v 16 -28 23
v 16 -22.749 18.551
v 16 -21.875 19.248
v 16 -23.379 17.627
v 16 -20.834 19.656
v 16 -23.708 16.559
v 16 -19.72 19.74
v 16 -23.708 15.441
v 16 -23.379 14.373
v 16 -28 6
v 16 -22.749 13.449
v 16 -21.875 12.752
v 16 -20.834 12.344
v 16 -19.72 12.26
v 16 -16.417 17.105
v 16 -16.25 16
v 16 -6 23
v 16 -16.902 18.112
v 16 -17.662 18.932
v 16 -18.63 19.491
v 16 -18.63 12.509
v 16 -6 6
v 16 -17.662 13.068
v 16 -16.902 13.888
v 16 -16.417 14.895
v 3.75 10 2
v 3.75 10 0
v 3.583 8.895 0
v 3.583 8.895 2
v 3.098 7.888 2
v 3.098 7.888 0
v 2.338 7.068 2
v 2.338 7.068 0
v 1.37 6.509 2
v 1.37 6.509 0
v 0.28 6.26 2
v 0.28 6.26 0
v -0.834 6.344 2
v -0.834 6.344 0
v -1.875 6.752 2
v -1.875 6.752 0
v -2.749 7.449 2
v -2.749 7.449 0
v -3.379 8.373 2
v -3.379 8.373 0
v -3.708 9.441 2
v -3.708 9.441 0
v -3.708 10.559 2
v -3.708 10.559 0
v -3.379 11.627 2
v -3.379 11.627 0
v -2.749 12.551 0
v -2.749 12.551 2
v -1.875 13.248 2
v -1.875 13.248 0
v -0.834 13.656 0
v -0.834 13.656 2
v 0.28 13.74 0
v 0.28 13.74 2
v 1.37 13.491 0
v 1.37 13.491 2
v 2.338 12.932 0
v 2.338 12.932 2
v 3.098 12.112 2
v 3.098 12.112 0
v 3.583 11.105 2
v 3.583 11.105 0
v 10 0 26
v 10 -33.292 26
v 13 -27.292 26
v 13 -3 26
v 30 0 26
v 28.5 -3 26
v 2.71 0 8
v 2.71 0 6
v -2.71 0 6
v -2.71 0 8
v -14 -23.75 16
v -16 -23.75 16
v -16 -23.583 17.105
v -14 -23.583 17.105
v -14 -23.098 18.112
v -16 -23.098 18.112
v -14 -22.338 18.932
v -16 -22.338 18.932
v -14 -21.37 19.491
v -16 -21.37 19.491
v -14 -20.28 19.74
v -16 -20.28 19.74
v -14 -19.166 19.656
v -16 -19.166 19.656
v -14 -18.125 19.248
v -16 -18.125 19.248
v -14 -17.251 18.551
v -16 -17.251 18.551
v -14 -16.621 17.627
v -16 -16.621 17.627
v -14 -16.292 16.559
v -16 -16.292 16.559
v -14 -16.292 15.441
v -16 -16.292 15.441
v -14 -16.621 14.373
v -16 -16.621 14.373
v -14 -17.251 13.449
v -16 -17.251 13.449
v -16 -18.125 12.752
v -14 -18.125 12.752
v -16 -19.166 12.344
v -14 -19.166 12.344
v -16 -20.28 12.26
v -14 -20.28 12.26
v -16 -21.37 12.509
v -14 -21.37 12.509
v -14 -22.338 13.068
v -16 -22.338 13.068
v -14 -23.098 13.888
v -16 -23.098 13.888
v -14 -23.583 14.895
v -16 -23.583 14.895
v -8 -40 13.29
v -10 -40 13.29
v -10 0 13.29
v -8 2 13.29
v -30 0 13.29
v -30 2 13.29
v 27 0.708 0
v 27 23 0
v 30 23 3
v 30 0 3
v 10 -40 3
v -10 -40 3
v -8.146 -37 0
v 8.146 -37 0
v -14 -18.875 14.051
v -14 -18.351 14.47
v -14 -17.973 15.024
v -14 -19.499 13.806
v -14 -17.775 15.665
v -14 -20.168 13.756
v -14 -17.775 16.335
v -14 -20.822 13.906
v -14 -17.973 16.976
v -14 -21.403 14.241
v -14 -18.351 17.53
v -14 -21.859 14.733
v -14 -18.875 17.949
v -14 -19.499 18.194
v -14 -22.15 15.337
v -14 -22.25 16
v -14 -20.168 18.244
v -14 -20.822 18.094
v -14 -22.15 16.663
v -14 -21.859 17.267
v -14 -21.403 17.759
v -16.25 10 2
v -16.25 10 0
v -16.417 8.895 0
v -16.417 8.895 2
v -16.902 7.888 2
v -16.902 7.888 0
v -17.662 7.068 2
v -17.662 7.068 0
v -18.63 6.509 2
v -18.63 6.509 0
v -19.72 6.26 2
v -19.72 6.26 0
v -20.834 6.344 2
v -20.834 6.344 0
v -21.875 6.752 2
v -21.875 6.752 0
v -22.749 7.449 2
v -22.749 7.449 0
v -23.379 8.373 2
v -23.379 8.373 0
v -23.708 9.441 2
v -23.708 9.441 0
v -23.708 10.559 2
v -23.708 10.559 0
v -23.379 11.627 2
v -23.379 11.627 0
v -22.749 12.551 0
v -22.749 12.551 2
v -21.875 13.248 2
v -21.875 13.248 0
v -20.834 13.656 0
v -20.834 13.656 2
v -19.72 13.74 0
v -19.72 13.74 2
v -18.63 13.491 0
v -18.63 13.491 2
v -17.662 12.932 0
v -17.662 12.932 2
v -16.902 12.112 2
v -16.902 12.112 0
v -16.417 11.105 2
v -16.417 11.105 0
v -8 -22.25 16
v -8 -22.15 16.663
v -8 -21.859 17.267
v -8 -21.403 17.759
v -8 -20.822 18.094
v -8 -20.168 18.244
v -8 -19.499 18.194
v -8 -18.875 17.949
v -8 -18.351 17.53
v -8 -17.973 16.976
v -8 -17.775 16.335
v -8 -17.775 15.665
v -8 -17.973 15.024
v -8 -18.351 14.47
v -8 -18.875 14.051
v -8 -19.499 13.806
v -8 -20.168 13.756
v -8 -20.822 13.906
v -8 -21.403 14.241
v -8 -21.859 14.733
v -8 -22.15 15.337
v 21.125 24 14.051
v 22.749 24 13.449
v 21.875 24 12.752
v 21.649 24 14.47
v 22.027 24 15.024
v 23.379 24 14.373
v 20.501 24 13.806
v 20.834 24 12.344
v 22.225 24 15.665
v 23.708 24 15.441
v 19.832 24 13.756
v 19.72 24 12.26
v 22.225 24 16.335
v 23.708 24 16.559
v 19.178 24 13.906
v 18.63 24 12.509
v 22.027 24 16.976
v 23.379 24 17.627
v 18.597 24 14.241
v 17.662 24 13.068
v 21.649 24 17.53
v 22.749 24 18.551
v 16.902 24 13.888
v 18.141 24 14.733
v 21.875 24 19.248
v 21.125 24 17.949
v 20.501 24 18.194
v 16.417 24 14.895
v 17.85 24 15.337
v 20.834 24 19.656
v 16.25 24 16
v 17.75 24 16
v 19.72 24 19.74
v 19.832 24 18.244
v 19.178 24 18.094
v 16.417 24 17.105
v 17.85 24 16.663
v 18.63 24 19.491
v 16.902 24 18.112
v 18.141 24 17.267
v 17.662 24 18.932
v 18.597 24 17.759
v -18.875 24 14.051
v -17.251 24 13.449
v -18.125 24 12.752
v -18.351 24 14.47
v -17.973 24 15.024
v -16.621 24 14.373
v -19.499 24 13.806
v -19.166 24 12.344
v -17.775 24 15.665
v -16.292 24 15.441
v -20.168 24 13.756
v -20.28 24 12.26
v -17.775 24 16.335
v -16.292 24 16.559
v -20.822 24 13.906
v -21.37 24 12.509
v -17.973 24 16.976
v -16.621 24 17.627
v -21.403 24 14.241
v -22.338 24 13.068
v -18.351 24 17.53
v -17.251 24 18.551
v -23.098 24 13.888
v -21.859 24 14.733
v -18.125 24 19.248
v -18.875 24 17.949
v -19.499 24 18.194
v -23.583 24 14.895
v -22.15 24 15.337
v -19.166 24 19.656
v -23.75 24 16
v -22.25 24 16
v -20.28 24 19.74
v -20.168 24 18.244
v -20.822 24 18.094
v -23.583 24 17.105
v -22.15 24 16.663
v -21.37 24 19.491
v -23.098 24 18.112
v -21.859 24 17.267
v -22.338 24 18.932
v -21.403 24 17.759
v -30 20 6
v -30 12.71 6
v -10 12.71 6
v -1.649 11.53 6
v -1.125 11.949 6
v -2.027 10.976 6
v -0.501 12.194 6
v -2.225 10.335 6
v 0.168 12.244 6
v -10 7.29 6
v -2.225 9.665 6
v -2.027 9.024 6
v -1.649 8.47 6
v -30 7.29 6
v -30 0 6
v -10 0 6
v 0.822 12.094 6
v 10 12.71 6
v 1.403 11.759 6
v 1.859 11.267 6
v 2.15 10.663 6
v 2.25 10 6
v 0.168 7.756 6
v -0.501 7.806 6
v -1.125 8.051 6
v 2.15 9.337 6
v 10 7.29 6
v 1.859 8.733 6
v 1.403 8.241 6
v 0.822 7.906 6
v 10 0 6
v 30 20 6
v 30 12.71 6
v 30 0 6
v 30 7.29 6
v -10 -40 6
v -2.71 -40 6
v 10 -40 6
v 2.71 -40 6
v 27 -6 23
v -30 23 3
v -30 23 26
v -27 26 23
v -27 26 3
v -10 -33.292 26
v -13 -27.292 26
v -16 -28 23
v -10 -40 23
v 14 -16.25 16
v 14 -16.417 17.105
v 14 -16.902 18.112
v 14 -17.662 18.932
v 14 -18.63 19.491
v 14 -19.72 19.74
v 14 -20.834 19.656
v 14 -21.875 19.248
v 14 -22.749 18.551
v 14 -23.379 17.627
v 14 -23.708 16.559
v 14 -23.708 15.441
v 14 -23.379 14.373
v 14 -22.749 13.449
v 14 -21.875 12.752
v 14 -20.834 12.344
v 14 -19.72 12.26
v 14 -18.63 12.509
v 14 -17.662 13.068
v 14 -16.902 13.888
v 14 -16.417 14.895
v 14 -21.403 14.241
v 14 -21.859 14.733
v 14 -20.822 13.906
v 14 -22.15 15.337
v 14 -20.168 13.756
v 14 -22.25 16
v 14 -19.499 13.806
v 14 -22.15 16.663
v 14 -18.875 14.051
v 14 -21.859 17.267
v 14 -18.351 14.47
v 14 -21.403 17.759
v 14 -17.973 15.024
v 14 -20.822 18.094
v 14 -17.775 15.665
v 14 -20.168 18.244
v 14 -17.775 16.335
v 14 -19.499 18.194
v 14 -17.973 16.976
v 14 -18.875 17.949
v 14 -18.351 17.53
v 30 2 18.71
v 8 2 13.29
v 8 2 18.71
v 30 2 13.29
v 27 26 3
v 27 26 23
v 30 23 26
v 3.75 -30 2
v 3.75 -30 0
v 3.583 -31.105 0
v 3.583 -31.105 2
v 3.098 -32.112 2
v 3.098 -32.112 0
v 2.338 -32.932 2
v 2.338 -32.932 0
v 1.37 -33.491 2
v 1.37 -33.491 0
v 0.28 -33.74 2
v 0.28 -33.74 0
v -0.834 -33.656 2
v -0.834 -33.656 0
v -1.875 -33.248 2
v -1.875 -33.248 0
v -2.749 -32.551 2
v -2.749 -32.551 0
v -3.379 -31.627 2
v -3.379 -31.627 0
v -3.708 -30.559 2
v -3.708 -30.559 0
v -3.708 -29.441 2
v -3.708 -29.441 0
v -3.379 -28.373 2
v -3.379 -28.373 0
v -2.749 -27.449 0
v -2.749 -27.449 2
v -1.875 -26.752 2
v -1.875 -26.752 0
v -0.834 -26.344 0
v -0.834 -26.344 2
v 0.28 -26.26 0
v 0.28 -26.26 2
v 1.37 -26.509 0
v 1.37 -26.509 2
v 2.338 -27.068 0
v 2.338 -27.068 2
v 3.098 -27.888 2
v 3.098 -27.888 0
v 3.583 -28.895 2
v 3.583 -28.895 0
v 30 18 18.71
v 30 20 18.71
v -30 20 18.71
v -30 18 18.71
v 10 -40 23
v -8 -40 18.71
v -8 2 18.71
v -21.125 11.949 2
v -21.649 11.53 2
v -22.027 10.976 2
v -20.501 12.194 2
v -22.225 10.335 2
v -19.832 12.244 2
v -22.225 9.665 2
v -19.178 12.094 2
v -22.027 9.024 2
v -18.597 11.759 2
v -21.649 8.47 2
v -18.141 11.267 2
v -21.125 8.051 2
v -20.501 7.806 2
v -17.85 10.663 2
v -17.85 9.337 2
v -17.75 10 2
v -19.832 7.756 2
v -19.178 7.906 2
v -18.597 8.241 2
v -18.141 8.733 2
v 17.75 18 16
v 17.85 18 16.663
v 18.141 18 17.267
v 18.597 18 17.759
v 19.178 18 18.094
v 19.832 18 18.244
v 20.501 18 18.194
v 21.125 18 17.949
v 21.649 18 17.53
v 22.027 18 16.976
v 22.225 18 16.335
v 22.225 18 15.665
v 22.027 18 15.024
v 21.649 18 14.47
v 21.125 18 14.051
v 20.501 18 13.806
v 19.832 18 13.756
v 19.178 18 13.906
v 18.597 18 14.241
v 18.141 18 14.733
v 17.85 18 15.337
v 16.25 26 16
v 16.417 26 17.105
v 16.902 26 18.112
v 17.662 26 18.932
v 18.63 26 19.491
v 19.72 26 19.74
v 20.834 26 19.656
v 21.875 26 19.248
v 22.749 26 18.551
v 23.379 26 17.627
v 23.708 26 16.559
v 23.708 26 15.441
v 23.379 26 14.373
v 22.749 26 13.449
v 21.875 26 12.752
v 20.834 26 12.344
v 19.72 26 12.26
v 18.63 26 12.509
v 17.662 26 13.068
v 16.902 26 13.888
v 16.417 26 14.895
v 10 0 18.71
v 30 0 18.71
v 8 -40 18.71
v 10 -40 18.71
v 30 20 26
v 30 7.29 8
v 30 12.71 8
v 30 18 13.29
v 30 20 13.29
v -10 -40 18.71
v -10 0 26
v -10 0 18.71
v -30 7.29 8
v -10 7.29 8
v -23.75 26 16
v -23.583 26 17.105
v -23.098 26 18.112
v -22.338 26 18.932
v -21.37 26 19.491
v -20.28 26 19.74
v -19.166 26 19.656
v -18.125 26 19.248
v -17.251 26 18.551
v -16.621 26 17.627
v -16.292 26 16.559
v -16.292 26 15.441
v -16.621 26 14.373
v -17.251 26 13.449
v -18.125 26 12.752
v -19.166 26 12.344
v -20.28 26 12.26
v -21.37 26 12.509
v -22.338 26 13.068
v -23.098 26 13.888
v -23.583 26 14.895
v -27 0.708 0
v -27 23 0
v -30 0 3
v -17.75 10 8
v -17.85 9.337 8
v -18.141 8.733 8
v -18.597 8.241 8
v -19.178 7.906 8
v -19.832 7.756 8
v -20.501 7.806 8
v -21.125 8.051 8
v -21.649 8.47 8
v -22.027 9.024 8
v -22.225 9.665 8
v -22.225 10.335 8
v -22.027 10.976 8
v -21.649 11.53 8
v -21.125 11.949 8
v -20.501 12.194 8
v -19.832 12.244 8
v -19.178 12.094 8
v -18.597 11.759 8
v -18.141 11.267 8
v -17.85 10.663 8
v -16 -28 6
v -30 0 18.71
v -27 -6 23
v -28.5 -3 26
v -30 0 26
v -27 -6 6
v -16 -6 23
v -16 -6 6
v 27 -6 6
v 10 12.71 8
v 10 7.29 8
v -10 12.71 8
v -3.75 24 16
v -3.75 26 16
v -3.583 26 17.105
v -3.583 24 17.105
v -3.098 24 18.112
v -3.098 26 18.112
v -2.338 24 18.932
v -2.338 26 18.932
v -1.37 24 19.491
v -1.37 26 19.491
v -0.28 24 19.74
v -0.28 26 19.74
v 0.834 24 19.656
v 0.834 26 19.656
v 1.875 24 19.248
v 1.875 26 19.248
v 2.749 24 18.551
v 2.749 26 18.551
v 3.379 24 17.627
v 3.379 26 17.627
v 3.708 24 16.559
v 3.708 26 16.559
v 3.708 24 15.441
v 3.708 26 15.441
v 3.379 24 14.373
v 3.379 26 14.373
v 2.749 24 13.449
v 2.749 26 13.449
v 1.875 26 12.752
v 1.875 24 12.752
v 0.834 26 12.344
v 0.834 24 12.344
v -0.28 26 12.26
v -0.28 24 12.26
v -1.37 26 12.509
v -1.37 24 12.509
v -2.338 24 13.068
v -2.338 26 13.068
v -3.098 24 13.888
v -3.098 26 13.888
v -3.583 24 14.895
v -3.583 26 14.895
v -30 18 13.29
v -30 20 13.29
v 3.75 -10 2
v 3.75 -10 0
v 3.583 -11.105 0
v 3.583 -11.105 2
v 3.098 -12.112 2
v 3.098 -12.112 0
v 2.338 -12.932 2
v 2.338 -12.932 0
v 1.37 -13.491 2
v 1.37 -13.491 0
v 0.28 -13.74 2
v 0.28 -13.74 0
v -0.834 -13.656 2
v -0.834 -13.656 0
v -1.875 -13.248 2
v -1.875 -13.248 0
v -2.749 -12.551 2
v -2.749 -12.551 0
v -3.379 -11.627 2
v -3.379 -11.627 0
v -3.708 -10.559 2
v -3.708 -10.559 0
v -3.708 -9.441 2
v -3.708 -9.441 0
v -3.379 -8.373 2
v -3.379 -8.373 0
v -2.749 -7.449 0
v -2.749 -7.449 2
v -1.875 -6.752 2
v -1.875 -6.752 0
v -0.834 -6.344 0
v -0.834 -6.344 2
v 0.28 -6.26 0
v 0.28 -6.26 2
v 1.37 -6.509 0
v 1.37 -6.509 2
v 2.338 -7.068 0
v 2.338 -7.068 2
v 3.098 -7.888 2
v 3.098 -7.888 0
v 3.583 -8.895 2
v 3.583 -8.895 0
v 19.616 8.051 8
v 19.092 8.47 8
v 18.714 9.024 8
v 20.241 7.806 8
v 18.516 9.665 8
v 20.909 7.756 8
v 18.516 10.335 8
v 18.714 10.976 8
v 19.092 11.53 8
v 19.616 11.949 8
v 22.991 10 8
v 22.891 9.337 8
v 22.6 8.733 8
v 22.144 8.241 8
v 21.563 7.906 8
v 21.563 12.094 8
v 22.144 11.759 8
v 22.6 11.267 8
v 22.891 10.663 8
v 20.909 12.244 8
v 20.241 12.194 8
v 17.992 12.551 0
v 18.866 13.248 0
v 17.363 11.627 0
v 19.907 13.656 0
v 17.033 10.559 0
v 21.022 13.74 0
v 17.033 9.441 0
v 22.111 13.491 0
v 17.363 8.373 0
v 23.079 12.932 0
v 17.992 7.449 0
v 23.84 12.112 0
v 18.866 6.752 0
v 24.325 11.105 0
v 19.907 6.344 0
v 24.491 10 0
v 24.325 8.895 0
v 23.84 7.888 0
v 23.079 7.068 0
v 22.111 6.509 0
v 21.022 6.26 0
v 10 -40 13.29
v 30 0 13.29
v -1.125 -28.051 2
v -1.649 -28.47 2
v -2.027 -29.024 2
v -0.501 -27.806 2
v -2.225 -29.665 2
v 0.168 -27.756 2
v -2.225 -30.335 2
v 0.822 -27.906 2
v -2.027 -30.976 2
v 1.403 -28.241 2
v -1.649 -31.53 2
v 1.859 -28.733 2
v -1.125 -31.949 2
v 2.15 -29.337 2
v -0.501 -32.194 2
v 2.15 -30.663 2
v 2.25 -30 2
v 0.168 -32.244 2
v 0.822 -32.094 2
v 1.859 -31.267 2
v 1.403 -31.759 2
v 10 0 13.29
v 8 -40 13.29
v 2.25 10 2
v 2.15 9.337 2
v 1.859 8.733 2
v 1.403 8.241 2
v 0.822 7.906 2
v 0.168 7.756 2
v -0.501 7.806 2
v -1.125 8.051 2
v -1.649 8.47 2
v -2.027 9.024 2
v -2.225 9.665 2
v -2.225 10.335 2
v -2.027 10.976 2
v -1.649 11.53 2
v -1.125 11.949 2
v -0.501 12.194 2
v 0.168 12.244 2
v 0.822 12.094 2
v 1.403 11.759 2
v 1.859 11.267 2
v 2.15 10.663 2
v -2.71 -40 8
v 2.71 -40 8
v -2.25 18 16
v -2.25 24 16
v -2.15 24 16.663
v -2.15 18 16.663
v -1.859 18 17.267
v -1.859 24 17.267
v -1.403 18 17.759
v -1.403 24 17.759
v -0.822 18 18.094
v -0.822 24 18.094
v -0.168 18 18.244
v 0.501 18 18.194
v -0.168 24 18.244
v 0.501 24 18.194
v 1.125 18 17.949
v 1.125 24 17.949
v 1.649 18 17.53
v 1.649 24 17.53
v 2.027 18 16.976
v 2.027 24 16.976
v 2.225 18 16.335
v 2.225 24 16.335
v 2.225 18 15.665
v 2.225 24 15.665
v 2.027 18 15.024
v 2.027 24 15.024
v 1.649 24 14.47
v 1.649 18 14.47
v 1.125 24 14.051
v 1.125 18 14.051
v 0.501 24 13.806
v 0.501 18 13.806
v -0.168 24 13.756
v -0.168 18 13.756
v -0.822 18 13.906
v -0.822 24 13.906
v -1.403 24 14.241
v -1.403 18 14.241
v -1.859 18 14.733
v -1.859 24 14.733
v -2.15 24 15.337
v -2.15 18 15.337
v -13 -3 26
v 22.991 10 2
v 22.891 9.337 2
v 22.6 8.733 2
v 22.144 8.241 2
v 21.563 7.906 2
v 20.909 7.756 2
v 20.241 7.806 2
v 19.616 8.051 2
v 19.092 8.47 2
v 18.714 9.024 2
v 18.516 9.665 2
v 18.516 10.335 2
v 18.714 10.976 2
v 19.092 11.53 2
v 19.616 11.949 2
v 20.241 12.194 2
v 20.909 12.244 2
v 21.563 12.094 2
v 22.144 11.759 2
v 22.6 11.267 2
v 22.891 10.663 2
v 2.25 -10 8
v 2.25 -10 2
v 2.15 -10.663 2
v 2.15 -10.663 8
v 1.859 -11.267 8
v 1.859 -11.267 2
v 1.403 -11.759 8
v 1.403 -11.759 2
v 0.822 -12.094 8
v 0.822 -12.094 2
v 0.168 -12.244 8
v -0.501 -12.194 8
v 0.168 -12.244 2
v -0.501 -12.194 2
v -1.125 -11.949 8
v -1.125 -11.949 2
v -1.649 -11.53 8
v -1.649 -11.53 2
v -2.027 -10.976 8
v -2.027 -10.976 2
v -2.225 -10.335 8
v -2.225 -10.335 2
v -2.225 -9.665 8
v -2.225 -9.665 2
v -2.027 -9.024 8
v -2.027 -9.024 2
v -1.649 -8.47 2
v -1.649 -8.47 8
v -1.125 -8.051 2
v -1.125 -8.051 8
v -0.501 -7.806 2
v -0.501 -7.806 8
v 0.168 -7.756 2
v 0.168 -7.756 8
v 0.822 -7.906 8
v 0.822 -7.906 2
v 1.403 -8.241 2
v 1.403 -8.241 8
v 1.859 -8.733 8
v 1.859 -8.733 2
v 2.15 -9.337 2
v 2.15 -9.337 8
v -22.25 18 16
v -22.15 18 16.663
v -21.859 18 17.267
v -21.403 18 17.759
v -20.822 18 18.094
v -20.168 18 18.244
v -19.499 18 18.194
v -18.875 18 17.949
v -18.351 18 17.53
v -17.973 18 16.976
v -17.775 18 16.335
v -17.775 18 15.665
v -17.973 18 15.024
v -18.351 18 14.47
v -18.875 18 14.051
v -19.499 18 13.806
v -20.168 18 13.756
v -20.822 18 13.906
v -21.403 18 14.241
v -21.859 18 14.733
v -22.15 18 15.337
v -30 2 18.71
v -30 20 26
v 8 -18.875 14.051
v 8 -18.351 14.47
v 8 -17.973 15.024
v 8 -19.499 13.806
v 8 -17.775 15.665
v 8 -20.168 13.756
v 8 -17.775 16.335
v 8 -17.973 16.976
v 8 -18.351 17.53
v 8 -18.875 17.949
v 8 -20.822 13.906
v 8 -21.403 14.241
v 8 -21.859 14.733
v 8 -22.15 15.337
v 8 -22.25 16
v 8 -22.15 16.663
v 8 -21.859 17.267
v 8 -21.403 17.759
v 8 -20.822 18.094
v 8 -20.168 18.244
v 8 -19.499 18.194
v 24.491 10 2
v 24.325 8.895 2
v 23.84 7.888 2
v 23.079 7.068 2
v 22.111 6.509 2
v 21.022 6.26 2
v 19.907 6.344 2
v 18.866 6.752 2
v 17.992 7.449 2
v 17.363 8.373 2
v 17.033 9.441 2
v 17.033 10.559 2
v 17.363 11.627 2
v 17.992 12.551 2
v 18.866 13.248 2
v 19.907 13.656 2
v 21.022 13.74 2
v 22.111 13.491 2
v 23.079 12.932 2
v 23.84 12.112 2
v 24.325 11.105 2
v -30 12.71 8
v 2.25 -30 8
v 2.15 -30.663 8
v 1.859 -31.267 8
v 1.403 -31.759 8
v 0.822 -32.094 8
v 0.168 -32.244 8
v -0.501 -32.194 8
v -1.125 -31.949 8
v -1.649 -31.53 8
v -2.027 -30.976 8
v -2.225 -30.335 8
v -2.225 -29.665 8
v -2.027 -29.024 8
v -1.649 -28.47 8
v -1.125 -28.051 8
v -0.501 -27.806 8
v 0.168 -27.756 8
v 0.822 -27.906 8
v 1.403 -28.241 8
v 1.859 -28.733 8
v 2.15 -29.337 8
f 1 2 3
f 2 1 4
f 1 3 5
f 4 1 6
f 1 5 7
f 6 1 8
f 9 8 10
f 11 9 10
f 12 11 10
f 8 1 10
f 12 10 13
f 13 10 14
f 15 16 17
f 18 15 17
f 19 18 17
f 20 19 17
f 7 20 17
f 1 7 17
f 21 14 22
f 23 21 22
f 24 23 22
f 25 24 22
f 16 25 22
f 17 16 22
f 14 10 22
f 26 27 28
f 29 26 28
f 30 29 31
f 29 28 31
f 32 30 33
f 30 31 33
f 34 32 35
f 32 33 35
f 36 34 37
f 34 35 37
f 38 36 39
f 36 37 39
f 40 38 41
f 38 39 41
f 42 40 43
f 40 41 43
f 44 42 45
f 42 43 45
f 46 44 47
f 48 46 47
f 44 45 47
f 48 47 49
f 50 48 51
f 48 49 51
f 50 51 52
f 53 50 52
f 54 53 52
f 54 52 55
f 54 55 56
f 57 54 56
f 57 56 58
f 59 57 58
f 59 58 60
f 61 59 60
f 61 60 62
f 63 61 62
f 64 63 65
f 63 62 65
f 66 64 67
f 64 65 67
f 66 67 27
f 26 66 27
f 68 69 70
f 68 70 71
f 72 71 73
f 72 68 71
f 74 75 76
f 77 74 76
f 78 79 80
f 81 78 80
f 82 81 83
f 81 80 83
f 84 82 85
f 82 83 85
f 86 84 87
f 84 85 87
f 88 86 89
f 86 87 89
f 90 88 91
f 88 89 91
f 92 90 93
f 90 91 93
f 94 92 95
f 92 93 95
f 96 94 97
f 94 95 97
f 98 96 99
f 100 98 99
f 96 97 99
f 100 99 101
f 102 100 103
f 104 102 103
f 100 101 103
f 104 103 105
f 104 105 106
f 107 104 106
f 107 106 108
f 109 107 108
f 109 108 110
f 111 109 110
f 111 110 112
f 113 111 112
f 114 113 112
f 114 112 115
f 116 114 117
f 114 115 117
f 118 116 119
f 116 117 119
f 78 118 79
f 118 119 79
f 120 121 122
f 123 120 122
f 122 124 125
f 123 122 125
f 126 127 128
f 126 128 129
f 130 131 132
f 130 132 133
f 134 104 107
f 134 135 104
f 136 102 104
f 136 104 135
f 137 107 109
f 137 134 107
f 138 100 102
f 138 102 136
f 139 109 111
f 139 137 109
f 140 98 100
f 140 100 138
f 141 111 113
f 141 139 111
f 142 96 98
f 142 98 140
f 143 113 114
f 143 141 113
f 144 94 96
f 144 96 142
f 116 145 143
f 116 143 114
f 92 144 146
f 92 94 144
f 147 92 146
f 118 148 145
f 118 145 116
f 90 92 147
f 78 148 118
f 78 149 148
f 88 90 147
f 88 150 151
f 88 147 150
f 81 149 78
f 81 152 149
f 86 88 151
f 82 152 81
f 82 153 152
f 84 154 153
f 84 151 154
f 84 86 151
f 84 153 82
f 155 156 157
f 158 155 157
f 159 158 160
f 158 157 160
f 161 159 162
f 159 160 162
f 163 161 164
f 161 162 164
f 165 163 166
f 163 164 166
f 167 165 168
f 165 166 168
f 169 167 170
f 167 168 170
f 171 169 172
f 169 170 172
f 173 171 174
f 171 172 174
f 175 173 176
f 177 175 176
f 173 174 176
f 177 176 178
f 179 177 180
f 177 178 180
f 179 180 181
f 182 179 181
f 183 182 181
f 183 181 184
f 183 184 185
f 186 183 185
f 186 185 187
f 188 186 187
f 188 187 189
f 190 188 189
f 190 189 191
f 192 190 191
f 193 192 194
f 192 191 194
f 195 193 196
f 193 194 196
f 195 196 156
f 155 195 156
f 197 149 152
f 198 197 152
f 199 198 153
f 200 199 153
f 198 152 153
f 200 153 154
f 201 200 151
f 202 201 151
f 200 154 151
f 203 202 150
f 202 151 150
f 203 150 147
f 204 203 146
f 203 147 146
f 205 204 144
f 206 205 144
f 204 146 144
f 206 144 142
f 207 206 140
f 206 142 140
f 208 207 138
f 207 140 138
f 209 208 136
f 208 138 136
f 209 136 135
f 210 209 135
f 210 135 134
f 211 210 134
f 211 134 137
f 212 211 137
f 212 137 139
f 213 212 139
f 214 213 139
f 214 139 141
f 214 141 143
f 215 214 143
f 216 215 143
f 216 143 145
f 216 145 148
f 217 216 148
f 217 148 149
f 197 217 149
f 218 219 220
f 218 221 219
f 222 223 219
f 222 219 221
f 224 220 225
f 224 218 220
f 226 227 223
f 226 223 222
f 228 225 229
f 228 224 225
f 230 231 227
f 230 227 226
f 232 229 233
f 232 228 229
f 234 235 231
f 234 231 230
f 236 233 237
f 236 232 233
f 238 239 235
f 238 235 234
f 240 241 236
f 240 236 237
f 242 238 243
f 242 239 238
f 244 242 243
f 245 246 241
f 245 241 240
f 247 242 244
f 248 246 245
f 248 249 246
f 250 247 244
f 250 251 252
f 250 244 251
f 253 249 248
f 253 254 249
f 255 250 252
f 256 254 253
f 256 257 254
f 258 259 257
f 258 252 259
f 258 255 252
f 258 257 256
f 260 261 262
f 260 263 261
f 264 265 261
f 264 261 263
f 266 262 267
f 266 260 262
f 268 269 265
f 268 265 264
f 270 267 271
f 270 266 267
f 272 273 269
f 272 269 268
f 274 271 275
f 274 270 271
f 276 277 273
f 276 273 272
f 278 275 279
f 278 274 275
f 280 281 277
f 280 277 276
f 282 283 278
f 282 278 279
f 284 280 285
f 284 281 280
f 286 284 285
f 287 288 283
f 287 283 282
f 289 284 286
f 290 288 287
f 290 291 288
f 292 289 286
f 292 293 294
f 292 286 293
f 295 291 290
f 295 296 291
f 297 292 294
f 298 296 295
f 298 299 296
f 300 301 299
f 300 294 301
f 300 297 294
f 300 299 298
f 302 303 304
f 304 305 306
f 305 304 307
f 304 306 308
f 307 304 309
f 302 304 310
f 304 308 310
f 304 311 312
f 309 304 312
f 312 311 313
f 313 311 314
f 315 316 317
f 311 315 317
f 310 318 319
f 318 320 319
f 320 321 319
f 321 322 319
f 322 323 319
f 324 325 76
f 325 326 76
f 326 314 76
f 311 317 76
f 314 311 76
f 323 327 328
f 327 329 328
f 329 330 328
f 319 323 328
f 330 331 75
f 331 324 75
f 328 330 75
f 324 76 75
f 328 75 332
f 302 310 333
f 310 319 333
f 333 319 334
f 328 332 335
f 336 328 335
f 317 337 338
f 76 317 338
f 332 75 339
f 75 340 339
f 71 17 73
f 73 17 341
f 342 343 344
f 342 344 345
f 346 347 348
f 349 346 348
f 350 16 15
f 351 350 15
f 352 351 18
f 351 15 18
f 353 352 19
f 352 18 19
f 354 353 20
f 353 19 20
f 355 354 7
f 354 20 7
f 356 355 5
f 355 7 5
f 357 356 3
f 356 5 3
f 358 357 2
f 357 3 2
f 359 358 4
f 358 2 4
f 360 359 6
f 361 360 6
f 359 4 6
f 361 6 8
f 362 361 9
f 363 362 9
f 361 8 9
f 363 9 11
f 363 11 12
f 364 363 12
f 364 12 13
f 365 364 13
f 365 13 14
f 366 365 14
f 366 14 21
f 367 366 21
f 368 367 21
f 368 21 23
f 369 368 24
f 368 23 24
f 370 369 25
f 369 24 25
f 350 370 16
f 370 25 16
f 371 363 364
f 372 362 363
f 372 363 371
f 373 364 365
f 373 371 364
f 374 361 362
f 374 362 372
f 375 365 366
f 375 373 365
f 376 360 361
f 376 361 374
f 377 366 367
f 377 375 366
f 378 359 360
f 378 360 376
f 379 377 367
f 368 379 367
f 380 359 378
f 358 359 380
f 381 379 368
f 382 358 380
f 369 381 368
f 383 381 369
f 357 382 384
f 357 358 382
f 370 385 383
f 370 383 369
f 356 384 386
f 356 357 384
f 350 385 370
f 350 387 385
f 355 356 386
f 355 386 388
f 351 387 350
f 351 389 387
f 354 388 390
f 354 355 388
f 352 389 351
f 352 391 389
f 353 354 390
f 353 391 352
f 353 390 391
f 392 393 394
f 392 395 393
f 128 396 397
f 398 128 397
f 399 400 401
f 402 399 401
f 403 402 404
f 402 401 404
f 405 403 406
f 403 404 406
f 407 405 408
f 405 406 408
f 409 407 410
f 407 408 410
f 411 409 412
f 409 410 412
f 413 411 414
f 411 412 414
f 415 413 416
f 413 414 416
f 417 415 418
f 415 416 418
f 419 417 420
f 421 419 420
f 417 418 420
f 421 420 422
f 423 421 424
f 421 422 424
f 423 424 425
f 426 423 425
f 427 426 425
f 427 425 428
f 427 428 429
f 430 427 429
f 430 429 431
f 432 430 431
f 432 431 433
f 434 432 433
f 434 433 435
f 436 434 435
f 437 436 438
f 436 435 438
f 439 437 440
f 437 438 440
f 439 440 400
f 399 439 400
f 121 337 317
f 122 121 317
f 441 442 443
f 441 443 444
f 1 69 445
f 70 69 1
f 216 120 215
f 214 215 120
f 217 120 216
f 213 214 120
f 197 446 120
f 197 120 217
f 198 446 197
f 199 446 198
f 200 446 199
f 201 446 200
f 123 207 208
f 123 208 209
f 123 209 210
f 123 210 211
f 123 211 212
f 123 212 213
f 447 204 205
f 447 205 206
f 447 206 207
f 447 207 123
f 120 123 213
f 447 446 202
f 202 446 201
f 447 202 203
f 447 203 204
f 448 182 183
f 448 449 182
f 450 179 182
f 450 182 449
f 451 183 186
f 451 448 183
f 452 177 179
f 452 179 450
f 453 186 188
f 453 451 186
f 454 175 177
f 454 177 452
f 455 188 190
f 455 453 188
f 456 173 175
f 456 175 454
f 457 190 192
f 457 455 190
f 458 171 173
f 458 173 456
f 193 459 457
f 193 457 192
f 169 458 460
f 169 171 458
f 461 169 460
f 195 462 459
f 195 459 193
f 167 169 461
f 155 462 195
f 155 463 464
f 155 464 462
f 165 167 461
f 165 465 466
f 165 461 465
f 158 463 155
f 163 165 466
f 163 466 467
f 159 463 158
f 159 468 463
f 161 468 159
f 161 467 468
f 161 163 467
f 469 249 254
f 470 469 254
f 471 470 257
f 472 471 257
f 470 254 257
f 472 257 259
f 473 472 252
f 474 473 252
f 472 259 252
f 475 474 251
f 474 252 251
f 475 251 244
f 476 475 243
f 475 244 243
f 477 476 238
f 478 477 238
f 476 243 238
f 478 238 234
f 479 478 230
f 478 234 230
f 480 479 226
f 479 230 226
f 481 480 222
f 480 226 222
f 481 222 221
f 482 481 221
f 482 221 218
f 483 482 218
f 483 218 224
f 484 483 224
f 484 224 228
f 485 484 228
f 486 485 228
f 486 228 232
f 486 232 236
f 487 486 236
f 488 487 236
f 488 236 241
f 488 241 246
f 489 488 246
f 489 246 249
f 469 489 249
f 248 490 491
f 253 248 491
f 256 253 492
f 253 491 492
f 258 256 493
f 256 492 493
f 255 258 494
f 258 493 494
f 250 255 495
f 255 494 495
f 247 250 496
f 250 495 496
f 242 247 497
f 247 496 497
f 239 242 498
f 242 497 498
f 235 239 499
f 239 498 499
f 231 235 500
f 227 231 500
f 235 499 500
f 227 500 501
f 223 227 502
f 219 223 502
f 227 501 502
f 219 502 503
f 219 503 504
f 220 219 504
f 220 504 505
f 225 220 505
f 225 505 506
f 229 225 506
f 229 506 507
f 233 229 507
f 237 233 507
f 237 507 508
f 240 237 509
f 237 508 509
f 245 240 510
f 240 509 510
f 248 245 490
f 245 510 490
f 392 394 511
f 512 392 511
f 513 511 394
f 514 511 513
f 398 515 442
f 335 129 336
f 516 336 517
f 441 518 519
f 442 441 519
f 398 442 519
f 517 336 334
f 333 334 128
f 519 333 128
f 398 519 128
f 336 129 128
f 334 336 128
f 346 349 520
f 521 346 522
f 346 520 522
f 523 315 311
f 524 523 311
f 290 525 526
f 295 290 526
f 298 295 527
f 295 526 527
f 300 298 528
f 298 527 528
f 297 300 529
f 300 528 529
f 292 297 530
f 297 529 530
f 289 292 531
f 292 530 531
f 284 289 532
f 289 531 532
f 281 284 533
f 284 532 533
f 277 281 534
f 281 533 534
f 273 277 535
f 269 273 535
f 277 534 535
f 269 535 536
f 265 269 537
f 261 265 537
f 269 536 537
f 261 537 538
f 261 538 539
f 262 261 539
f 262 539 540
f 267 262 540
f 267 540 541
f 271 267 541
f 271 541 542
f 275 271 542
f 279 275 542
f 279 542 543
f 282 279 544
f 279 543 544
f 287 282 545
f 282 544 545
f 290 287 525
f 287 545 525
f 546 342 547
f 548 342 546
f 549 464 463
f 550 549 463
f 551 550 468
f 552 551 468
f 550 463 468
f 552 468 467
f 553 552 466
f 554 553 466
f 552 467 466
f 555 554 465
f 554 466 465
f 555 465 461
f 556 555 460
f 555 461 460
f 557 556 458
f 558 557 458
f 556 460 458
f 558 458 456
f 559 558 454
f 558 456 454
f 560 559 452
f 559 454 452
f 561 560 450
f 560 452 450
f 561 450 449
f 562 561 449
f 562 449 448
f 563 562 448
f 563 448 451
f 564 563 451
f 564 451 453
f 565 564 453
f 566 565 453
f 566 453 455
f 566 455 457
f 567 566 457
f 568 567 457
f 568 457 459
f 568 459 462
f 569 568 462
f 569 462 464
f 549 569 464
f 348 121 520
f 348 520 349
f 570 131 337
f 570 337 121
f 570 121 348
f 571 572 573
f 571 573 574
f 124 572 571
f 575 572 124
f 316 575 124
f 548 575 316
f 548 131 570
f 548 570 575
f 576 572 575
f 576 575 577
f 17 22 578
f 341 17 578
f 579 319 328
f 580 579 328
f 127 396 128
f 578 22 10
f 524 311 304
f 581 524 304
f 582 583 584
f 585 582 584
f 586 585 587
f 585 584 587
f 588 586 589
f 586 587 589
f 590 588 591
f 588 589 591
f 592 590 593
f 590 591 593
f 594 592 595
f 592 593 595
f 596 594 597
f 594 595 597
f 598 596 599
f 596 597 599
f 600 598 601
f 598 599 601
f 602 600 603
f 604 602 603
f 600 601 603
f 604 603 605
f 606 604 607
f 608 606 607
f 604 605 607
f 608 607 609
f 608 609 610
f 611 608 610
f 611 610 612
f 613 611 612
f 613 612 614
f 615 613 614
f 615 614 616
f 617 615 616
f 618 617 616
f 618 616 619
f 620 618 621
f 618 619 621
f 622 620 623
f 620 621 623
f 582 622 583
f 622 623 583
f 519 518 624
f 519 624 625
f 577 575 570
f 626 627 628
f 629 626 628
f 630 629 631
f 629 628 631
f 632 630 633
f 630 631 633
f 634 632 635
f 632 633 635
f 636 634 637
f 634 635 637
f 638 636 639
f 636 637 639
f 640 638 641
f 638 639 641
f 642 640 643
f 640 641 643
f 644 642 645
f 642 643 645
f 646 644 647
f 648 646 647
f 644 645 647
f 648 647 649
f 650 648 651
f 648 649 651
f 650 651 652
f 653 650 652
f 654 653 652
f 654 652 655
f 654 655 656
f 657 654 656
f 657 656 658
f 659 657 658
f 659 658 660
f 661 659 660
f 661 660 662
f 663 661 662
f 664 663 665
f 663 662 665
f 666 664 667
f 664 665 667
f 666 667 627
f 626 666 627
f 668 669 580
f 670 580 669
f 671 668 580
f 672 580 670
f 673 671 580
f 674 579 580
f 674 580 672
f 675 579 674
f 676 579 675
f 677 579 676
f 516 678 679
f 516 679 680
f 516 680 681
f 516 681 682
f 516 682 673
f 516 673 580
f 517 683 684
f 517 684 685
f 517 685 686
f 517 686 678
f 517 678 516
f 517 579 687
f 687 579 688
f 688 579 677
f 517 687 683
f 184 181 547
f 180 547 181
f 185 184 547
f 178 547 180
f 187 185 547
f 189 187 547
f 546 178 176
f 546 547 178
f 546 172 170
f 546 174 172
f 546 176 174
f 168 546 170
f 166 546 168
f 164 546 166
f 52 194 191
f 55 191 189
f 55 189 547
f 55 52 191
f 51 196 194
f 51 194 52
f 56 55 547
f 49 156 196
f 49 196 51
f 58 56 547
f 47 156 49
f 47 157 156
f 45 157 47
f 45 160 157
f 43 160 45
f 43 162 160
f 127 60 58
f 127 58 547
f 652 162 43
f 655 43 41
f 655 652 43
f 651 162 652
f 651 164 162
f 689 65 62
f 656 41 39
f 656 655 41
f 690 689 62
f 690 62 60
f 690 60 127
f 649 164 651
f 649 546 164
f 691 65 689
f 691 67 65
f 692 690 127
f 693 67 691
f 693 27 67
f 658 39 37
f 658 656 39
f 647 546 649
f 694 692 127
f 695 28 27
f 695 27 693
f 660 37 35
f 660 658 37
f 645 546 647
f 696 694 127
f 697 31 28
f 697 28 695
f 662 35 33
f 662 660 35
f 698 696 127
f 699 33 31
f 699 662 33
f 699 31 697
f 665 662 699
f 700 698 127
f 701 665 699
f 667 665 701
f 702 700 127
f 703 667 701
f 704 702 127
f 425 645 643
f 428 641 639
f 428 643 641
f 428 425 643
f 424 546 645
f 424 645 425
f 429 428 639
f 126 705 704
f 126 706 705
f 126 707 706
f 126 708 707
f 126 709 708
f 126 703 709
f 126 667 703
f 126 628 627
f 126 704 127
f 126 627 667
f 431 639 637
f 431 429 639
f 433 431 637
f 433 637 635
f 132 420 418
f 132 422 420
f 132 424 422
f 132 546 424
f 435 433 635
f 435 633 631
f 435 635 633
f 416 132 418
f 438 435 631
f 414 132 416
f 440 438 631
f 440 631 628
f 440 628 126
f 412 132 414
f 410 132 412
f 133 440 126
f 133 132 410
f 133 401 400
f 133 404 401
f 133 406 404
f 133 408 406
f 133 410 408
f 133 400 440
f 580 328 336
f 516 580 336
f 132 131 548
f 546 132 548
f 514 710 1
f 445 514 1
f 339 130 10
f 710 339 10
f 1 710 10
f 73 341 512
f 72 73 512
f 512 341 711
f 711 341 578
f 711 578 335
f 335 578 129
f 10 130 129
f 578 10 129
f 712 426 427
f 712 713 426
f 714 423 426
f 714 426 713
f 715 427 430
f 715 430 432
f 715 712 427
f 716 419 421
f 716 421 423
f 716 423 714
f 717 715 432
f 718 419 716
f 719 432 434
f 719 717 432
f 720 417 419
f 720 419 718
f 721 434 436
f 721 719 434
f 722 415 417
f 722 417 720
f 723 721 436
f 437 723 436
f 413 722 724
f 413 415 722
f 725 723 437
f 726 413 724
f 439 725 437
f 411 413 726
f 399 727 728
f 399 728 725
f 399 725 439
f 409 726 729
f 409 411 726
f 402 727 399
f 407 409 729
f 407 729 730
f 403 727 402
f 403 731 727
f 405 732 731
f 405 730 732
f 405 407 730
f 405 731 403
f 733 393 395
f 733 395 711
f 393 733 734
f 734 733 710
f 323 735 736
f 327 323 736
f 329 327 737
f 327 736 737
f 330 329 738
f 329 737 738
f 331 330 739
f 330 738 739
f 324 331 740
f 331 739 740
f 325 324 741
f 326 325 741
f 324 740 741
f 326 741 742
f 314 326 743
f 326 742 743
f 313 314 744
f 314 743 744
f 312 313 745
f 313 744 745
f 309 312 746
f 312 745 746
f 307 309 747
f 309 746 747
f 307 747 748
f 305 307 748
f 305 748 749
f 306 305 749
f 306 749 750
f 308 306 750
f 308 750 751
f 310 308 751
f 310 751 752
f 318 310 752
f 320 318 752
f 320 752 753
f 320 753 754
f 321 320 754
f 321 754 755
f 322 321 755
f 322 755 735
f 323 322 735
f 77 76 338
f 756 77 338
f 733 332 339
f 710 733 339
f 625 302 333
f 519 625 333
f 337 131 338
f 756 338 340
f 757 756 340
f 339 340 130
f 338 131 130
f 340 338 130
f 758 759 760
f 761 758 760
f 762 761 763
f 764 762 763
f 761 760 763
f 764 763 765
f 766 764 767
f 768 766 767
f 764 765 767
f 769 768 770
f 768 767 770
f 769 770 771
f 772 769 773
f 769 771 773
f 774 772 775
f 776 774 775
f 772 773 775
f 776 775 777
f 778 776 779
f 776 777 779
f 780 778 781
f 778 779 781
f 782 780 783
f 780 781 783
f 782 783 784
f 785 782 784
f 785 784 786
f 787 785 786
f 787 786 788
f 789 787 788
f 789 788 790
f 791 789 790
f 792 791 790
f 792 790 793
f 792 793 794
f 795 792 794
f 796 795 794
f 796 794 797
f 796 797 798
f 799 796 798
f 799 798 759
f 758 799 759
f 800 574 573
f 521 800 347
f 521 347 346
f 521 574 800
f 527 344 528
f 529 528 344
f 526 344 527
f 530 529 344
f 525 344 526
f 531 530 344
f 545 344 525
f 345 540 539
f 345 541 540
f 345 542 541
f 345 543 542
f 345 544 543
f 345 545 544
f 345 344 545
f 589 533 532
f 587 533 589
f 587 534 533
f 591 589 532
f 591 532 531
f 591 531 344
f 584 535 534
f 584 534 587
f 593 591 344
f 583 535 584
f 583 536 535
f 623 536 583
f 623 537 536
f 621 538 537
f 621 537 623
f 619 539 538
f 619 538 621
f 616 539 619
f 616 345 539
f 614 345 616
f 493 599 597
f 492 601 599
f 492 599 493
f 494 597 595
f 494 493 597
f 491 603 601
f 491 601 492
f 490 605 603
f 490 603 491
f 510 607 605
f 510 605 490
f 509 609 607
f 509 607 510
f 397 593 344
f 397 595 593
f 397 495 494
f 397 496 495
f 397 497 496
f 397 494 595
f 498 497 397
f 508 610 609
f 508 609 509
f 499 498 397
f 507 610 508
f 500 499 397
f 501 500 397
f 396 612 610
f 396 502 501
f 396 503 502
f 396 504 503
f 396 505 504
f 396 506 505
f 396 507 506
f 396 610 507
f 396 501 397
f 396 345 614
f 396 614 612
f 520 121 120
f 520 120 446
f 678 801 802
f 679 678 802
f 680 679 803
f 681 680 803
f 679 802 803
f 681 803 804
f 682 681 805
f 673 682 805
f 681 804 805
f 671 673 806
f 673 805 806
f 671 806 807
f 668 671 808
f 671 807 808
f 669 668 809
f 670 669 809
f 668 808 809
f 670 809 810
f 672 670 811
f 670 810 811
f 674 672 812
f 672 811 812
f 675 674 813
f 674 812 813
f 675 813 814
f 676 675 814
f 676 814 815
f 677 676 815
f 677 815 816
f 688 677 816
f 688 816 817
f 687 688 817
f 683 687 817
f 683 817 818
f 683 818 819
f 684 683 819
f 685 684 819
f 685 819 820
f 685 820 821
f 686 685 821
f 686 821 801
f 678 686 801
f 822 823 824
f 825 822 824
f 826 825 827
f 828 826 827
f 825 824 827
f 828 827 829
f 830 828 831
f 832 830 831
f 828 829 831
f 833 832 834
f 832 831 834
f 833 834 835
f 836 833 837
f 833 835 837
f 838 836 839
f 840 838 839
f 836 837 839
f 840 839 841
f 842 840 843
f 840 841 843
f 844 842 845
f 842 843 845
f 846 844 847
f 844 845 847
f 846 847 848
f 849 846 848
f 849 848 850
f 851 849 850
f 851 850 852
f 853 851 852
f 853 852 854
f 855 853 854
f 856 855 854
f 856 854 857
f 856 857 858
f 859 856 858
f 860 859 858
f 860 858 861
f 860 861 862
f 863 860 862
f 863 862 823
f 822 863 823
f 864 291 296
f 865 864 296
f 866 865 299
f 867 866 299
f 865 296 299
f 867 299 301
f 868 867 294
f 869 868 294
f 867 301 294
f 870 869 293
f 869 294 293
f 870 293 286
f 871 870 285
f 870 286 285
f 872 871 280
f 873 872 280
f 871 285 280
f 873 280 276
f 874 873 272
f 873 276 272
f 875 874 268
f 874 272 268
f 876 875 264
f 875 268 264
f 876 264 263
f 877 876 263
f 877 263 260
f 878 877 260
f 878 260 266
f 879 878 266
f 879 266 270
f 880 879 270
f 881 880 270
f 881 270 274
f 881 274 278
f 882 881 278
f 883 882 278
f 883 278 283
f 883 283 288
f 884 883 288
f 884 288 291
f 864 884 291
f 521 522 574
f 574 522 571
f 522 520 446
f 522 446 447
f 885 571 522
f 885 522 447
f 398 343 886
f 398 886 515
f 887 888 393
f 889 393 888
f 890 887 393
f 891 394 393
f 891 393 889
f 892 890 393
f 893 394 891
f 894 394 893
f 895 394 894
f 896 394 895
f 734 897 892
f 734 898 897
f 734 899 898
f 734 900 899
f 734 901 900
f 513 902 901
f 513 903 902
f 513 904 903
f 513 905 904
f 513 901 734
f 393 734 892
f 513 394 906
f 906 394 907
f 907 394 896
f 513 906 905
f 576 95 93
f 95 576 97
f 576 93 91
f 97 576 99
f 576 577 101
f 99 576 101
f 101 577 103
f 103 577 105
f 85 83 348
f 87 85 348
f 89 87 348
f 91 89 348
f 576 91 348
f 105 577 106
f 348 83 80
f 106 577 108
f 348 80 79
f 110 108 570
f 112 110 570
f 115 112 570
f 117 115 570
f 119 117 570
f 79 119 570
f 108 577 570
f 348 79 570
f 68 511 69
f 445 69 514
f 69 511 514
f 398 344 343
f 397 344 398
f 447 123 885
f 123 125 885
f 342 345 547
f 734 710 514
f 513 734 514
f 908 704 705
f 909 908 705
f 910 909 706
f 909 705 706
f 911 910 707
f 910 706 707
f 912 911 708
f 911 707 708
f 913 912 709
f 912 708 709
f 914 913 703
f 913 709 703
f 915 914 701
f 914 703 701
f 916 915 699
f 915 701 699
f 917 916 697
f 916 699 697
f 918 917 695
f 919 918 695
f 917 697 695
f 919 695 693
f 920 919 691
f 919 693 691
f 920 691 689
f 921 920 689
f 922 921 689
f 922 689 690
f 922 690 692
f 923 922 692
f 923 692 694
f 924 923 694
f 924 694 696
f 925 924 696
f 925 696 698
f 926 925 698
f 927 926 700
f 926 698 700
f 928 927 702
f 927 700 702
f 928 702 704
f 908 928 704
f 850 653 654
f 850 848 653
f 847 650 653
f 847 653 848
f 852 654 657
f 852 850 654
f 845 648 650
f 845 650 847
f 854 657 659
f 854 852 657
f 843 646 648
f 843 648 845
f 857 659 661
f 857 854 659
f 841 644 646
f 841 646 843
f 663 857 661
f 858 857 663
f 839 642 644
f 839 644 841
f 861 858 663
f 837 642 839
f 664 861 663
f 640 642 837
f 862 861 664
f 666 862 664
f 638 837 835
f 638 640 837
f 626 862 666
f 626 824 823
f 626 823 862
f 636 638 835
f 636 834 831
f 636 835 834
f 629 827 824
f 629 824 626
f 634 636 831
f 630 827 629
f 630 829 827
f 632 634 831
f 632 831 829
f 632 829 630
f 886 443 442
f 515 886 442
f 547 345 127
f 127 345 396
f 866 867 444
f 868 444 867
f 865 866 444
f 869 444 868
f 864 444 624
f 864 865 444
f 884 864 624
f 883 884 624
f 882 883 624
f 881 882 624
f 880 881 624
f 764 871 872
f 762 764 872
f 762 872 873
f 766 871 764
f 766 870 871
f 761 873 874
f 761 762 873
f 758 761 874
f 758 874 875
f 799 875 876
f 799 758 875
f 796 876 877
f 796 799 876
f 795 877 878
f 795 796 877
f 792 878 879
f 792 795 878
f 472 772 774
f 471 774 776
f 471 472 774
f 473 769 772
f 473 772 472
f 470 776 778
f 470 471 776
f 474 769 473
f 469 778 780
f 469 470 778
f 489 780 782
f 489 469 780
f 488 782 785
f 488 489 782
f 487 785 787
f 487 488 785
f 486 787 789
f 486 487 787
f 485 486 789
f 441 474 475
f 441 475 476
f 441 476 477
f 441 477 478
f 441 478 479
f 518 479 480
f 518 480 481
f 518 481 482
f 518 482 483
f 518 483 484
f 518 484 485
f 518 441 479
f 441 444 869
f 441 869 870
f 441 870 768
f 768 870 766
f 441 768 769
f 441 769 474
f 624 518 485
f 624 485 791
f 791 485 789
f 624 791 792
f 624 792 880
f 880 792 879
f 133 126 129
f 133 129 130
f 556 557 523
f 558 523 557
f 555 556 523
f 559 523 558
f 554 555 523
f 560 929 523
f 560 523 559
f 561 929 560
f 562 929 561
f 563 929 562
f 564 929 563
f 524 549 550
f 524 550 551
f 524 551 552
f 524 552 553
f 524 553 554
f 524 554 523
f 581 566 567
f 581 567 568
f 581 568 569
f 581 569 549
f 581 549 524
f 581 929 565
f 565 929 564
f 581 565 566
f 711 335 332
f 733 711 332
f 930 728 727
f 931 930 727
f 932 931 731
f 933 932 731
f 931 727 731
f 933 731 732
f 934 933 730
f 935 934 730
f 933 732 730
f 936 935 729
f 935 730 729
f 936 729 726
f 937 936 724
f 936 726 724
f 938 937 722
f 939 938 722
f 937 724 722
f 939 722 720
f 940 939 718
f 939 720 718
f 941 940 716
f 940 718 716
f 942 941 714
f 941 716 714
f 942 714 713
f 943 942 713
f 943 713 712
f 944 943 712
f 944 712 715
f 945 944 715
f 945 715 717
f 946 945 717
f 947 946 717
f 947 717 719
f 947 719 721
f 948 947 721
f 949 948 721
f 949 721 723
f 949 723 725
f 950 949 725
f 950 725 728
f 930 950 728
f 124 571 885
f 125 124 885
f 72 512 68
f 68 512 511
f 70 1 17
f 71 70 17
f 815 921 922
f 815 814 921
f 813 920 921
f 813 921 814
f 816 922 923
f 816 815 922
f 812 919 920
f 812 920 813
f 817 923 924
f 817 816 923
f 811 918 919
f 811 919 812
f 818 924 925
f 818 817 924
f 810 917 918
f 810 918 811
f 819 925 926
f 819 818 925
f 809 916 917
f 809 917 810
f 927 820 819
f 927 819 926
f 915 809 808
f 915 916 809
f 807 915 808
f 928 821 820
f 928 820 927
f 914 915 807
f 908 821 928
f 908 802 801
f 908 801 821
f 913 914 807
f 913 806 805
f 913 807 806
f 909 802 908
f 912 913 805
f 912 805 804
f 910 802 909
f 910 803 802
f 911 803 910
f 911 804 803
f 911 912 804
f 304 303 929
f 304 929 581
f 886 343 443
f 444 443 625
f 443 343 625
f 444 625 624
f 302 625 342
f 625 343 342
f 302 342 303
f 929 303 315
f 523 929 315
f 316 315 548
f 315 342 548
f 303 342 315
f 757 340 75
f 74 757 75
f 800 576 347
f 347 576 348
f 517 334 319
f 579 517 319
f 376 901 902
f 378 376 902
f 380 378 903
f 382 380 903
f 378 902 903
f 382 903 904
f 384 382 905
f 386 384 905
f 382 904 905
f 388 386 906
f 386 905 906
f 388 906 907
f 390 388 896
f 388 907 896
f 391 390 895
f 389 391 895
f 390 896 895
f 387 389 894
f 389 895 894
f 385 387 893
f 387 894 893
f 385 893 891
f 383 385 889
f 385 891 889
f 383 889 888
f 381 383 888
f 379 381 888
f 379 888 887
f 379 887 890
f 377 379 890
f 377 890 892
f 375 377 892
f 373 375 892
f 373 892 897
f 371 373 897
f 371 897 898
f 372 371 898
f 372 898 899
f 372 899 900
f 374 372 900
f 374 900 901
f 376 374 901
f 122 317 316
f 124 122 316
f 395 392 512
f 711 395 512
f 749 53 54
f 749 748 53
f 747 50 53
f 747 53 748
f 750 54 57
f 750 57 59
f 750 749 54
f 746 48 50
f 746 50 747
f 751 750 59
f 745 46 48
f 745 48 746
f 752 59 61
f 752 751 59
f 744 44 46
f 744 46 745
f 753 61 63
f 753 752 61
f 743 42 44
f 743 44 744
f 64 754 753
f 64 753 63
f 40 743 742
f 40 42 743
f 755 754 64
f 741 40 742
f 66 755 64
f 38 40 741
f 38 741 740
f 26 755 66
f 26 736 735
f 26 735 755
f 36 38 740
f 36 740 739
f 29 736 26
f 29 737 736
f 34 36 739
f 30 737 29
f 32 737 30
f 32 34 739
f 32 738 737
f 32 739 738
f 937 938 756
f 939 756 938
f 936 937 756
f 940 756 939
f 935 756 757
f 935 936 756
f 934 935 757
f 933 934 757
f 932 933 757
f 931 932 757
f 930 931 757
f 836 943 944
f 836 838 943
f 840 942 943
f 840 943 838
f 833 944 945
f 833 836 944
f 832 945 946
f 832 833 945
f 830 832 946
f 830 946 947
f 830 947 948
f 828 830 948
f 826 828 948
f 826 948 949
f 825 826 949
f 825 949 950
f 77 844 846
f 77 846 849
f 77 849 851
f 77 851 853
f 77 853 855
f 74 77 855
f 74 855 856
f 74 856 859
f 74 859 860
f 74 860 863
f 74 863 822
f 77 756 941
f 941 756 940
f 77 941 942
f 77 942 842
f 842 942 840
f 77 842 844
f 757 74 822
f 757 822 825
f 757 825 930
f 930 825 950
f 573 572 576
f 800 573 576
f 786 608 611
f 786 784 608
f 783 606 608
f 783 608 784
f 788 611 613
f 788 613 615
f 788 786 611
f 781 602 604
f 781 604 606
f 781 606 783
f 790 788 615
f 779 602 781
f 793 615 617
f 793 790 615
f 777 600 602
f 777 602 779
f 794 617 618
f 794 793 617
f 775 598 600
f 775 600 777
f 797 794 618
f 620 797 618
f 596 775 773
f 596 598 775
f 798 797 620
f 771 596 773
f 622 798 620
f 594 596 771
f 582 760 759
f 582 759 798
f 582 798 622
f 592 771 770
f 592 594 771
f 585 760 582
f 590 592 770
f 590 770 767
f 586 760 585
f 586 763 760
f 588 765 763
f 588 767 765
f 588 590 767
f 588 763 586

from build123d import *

# Parameters (mm, degrees)
F1_DEPTH  = 6
F2_W      = 20
F2_H      = 5.42
F3_DEPTH  = 2
F4_R      = 2.25
F5_DEPTH  = 8.001
F6_R      = 3.75
F7_DEPTH  = 2
F8_W      = 60
F8_H      = 6
F9_DEPTH  = 6
F10_W     = 60
F10_H     = 6
F11_DEPTH = 20
F13_DEPTH = 60
F15_DEPTH = 20
F16_W     = 42
F16_H     = 5.42
F17_DEPTH = 2
F19_DEPTH = 20
F20_W     = 42
F20_H     = 5.42
F21_DEPTH = 2
F22_R     = 2.25
F23_DEPTH = 46.001
F24_R     = 2.25
F25_DEPTH = 8
F26_R     = 3.75
F27_DEPTH = 2
F28_R     = 3.75
F29_DEPTH = 2
F30_R     = 3.75
F31_DEPTH = 2
F32_SIZE  = 3


with BuildPart() as f1:
    # F0 (on Top) → F1 (new body)
    with BuildSketch(Plane.XY):
        Polygon((-30, 0), (-10, 0), (-10, -40), (0, -40), (10, -40), (10, 0), (30, 0), (30, 20), (0, 20), (-30, 20), align=None)
    extrude(amount=F1_DEPTH)

    # F2 (on face) → F3 (join)
    with BuildSketch(Plane.XY.offset(6)):
        Polygon((2.71, 0), (0, 0), (-2.71, 0), (-2.71, -40), (2.71, -40), align=None)
        Polygon((10, 12.71), (10, 10), (10, 7.29), (30, 7.29), (30, 12.71), align=None)
        with Locations((-20, 10)):
            Rectangle(F2_W, F2_H)
    extrude(amount=F3_DEPTH)

    # F4 (on face) → F5 (cut, through all)
    with BuildSketch(Plane(origin=(0, 0, 0), x_dir=(1, 0, 0), z_dir=(0, 0, -1))):
        with Locations((-20, -10)):
            Circle(F4_R)
        with Locations((0, 10)):
            Circle(F4_R)
        with Locations((0, 30)):
            Circle(F4_R)
        with Locations((20.741304, -10)):
            Circle(F4_R)
        with Locations((0, -10)):
            Circle(F4_R)
    extrude(amount=-F5_DEPTH, mode=Mode.SUBTRACT)

    # F6 (on face) → F7 (cut)
    with BuildSketch(Plane(origin=(0, 0, 0), x_dir=(1, 0, 0), z_dir=(0, 0, -1))):
        with Locations((0, 30)):
            Circle(F6_R)
        with Locations((0, 10)):
            Circle(F6_R)
        with Locations((20.741304, -10)):
            Circle(F6_R)
        with Locations((-20, -10)):
            Circle(F6_R)
        with Locations((0, -10)):
            Circle(F6_R)
    extrude(amount=-F7_DEPTH, mode=Mode.SUBTRACT)

    # F8 (on face) → F9 (join)
    with BuildSketch(Plane(origin=(0, 0, 0), x_dir=(1, 0, 0), z_dir=(0, 0, -1))):
        Polygon((-10, 0), (-10, 40), (-30, 0), align=None)
        Polygon((30, 0), (10, 40), (10, 0), align=None)
        with Locations((0, -23)):
            Rectangle(F8_W, F8_H)
    extrude(amount=-F9_DEPTH)

    # F10 (on face) → F11 (join)
    with BuildSketch(Plane.XY.offset(6)):
        Polygon((30, 0), (10, 0), (10, -40), (16, -28), (16, -6), (27, -6), align=None)
        Polygon((-10, -40), (-10, 0), (-30, 0), (-27, -6), (-16, -6), (-16, -28), align=None)
        with Locations((0, 23)):
            Rectangle(F10_W, F10_H)
    extrude(amount=F11_DEPTH)

    # F12 (on face) → F13 (join)
    with BuildSketch(Plane.YZ.offset(30)):
        Polygon((20, 13.29), (20, 16), (20, 18.71), (18, 18.71), (18, 13.29), align=None)
    extrude(amount=-F13_DEPTH)

    # F14 (on face) → F15 (join)
    with BuildSketch(Plane.YZ.offset(-10)):
        Polygon((0, 18.71), (0, 16), (0, 13.29), (2, 13.29), (2, 18.71), align=None)
    extrude(amount=-F15_DEPTH)

    # F16 (on face) → F17 (join)
    with BuildSketch(Plane.YZ.offset(-10)):
        with Locations((-19, 16)):
            Rectangle(F16_W, F16_H)
    extrude(amount=F17_DEPTH)

    # F18 (on face) → F19 (join)
    with BuildSketch(Plane(origin=(10, 0, 0), x_dir=(0, -1, 0), z_dir=(-1, 0, 0))):
        Polygon((0, 13.29), (0, 16), (0, 18.71), (-2, 18.71), (-2, 13.29), align=None)
    extrude(amount=-F19_DEPTH)

    # F20 (on face) → F21 (join)
    with BuildSketch(Plane(origin=(10, 0, 0), x_dir=(0, -1, 0), z_dir=(-1, 0, 0))):
        with Locations((19, 16)):
            Rectangle(F20_W, F20_H)
    extrude(amount=F21_DEPTH)

    # F22 (on face) → F23 (cut, through all)
    with BuildSketch(Plane(origin=(-16, 0, 0), x_dir=(0, -1, 0), z_dir=(-1, 0, 0))):
        with Locations((20, 16)):
            Circle(F22_R)
    extrude(amount=-F23_DEPTH, mode=Mode.SUBTRACT)

    # F24 (on face) → F25 (cut, through all)
    with BuildSketch(Plane(origin=(0, 26, 0), x_dir=(-1, 0, 0), z_dir=(0, 1, 0))):
        with Locations((-20, 16)):
            Circle(F24_R)
        with Locations((0, 16)):
            Circle(F24_R)
        with Locations((20, 16)):
            Circle(F24_R)
    extrude(amount=-F25_DEPTH, mode=Mode.SUBTRACT)

    # F26 (on face) → F27 (cut)
    with BuildSketch(Plane.YZ.offset(16)):
        with Locations((-20, 16)):
            Circle(F26_R)
    extrude(amount=-F27_DEPTH, mode=Mode.SUBTRACT)

    # F28 (on face) → F29 (cut)
    with BuildSketch(Plane(origin=(-16, 0, 0), x_dir=(0, -1, 0), z_dir=(-1, 0, 0))):
        with Locations((20, 16)):
            Circle(F28_R)
    extrude(amount=-F29_DEPTH, mode=Mode.SUBTRACT)

    # F30 (on face) → F31 (cut)
    with BuildSketch(Plane(origin=(0, 26, 0), x_dir=(-1, 0, 0), z_dir=(0, 1, 0))):
        with Locations((-20, 16)):
            Circle(F30_R)
        with Locations((0, 16)):
            Circle(F30_R)
        with Locations((20, 16)):
            Circle(F30_R)
    extrude(amount=-F31_DEPTH, mode=Mode.SUBTRACT)

    # F32
    f32_edges = [f1.edges().sort_by_distance(p)[0] for p in [
        (0, 26, 0),
        (30, 26, 13),
        (-30, 26, 13),
        (-30, 13, 0),
        (30, 13, 0),
        (20, -20, 0),
        (-20, -20, 0),
        (0, -40, 0),
        (0, 26, 26),
        (-21.5, -6, 26),
        (-16, -17, 26),
        (16, -17, 26),
        (21.5, -6, 26),
        (-13, -34, 26),
        (13, -34, 26),
    ]]
    chamfer(f32_edges, length=F32_SIZE)


solid = f1.part
